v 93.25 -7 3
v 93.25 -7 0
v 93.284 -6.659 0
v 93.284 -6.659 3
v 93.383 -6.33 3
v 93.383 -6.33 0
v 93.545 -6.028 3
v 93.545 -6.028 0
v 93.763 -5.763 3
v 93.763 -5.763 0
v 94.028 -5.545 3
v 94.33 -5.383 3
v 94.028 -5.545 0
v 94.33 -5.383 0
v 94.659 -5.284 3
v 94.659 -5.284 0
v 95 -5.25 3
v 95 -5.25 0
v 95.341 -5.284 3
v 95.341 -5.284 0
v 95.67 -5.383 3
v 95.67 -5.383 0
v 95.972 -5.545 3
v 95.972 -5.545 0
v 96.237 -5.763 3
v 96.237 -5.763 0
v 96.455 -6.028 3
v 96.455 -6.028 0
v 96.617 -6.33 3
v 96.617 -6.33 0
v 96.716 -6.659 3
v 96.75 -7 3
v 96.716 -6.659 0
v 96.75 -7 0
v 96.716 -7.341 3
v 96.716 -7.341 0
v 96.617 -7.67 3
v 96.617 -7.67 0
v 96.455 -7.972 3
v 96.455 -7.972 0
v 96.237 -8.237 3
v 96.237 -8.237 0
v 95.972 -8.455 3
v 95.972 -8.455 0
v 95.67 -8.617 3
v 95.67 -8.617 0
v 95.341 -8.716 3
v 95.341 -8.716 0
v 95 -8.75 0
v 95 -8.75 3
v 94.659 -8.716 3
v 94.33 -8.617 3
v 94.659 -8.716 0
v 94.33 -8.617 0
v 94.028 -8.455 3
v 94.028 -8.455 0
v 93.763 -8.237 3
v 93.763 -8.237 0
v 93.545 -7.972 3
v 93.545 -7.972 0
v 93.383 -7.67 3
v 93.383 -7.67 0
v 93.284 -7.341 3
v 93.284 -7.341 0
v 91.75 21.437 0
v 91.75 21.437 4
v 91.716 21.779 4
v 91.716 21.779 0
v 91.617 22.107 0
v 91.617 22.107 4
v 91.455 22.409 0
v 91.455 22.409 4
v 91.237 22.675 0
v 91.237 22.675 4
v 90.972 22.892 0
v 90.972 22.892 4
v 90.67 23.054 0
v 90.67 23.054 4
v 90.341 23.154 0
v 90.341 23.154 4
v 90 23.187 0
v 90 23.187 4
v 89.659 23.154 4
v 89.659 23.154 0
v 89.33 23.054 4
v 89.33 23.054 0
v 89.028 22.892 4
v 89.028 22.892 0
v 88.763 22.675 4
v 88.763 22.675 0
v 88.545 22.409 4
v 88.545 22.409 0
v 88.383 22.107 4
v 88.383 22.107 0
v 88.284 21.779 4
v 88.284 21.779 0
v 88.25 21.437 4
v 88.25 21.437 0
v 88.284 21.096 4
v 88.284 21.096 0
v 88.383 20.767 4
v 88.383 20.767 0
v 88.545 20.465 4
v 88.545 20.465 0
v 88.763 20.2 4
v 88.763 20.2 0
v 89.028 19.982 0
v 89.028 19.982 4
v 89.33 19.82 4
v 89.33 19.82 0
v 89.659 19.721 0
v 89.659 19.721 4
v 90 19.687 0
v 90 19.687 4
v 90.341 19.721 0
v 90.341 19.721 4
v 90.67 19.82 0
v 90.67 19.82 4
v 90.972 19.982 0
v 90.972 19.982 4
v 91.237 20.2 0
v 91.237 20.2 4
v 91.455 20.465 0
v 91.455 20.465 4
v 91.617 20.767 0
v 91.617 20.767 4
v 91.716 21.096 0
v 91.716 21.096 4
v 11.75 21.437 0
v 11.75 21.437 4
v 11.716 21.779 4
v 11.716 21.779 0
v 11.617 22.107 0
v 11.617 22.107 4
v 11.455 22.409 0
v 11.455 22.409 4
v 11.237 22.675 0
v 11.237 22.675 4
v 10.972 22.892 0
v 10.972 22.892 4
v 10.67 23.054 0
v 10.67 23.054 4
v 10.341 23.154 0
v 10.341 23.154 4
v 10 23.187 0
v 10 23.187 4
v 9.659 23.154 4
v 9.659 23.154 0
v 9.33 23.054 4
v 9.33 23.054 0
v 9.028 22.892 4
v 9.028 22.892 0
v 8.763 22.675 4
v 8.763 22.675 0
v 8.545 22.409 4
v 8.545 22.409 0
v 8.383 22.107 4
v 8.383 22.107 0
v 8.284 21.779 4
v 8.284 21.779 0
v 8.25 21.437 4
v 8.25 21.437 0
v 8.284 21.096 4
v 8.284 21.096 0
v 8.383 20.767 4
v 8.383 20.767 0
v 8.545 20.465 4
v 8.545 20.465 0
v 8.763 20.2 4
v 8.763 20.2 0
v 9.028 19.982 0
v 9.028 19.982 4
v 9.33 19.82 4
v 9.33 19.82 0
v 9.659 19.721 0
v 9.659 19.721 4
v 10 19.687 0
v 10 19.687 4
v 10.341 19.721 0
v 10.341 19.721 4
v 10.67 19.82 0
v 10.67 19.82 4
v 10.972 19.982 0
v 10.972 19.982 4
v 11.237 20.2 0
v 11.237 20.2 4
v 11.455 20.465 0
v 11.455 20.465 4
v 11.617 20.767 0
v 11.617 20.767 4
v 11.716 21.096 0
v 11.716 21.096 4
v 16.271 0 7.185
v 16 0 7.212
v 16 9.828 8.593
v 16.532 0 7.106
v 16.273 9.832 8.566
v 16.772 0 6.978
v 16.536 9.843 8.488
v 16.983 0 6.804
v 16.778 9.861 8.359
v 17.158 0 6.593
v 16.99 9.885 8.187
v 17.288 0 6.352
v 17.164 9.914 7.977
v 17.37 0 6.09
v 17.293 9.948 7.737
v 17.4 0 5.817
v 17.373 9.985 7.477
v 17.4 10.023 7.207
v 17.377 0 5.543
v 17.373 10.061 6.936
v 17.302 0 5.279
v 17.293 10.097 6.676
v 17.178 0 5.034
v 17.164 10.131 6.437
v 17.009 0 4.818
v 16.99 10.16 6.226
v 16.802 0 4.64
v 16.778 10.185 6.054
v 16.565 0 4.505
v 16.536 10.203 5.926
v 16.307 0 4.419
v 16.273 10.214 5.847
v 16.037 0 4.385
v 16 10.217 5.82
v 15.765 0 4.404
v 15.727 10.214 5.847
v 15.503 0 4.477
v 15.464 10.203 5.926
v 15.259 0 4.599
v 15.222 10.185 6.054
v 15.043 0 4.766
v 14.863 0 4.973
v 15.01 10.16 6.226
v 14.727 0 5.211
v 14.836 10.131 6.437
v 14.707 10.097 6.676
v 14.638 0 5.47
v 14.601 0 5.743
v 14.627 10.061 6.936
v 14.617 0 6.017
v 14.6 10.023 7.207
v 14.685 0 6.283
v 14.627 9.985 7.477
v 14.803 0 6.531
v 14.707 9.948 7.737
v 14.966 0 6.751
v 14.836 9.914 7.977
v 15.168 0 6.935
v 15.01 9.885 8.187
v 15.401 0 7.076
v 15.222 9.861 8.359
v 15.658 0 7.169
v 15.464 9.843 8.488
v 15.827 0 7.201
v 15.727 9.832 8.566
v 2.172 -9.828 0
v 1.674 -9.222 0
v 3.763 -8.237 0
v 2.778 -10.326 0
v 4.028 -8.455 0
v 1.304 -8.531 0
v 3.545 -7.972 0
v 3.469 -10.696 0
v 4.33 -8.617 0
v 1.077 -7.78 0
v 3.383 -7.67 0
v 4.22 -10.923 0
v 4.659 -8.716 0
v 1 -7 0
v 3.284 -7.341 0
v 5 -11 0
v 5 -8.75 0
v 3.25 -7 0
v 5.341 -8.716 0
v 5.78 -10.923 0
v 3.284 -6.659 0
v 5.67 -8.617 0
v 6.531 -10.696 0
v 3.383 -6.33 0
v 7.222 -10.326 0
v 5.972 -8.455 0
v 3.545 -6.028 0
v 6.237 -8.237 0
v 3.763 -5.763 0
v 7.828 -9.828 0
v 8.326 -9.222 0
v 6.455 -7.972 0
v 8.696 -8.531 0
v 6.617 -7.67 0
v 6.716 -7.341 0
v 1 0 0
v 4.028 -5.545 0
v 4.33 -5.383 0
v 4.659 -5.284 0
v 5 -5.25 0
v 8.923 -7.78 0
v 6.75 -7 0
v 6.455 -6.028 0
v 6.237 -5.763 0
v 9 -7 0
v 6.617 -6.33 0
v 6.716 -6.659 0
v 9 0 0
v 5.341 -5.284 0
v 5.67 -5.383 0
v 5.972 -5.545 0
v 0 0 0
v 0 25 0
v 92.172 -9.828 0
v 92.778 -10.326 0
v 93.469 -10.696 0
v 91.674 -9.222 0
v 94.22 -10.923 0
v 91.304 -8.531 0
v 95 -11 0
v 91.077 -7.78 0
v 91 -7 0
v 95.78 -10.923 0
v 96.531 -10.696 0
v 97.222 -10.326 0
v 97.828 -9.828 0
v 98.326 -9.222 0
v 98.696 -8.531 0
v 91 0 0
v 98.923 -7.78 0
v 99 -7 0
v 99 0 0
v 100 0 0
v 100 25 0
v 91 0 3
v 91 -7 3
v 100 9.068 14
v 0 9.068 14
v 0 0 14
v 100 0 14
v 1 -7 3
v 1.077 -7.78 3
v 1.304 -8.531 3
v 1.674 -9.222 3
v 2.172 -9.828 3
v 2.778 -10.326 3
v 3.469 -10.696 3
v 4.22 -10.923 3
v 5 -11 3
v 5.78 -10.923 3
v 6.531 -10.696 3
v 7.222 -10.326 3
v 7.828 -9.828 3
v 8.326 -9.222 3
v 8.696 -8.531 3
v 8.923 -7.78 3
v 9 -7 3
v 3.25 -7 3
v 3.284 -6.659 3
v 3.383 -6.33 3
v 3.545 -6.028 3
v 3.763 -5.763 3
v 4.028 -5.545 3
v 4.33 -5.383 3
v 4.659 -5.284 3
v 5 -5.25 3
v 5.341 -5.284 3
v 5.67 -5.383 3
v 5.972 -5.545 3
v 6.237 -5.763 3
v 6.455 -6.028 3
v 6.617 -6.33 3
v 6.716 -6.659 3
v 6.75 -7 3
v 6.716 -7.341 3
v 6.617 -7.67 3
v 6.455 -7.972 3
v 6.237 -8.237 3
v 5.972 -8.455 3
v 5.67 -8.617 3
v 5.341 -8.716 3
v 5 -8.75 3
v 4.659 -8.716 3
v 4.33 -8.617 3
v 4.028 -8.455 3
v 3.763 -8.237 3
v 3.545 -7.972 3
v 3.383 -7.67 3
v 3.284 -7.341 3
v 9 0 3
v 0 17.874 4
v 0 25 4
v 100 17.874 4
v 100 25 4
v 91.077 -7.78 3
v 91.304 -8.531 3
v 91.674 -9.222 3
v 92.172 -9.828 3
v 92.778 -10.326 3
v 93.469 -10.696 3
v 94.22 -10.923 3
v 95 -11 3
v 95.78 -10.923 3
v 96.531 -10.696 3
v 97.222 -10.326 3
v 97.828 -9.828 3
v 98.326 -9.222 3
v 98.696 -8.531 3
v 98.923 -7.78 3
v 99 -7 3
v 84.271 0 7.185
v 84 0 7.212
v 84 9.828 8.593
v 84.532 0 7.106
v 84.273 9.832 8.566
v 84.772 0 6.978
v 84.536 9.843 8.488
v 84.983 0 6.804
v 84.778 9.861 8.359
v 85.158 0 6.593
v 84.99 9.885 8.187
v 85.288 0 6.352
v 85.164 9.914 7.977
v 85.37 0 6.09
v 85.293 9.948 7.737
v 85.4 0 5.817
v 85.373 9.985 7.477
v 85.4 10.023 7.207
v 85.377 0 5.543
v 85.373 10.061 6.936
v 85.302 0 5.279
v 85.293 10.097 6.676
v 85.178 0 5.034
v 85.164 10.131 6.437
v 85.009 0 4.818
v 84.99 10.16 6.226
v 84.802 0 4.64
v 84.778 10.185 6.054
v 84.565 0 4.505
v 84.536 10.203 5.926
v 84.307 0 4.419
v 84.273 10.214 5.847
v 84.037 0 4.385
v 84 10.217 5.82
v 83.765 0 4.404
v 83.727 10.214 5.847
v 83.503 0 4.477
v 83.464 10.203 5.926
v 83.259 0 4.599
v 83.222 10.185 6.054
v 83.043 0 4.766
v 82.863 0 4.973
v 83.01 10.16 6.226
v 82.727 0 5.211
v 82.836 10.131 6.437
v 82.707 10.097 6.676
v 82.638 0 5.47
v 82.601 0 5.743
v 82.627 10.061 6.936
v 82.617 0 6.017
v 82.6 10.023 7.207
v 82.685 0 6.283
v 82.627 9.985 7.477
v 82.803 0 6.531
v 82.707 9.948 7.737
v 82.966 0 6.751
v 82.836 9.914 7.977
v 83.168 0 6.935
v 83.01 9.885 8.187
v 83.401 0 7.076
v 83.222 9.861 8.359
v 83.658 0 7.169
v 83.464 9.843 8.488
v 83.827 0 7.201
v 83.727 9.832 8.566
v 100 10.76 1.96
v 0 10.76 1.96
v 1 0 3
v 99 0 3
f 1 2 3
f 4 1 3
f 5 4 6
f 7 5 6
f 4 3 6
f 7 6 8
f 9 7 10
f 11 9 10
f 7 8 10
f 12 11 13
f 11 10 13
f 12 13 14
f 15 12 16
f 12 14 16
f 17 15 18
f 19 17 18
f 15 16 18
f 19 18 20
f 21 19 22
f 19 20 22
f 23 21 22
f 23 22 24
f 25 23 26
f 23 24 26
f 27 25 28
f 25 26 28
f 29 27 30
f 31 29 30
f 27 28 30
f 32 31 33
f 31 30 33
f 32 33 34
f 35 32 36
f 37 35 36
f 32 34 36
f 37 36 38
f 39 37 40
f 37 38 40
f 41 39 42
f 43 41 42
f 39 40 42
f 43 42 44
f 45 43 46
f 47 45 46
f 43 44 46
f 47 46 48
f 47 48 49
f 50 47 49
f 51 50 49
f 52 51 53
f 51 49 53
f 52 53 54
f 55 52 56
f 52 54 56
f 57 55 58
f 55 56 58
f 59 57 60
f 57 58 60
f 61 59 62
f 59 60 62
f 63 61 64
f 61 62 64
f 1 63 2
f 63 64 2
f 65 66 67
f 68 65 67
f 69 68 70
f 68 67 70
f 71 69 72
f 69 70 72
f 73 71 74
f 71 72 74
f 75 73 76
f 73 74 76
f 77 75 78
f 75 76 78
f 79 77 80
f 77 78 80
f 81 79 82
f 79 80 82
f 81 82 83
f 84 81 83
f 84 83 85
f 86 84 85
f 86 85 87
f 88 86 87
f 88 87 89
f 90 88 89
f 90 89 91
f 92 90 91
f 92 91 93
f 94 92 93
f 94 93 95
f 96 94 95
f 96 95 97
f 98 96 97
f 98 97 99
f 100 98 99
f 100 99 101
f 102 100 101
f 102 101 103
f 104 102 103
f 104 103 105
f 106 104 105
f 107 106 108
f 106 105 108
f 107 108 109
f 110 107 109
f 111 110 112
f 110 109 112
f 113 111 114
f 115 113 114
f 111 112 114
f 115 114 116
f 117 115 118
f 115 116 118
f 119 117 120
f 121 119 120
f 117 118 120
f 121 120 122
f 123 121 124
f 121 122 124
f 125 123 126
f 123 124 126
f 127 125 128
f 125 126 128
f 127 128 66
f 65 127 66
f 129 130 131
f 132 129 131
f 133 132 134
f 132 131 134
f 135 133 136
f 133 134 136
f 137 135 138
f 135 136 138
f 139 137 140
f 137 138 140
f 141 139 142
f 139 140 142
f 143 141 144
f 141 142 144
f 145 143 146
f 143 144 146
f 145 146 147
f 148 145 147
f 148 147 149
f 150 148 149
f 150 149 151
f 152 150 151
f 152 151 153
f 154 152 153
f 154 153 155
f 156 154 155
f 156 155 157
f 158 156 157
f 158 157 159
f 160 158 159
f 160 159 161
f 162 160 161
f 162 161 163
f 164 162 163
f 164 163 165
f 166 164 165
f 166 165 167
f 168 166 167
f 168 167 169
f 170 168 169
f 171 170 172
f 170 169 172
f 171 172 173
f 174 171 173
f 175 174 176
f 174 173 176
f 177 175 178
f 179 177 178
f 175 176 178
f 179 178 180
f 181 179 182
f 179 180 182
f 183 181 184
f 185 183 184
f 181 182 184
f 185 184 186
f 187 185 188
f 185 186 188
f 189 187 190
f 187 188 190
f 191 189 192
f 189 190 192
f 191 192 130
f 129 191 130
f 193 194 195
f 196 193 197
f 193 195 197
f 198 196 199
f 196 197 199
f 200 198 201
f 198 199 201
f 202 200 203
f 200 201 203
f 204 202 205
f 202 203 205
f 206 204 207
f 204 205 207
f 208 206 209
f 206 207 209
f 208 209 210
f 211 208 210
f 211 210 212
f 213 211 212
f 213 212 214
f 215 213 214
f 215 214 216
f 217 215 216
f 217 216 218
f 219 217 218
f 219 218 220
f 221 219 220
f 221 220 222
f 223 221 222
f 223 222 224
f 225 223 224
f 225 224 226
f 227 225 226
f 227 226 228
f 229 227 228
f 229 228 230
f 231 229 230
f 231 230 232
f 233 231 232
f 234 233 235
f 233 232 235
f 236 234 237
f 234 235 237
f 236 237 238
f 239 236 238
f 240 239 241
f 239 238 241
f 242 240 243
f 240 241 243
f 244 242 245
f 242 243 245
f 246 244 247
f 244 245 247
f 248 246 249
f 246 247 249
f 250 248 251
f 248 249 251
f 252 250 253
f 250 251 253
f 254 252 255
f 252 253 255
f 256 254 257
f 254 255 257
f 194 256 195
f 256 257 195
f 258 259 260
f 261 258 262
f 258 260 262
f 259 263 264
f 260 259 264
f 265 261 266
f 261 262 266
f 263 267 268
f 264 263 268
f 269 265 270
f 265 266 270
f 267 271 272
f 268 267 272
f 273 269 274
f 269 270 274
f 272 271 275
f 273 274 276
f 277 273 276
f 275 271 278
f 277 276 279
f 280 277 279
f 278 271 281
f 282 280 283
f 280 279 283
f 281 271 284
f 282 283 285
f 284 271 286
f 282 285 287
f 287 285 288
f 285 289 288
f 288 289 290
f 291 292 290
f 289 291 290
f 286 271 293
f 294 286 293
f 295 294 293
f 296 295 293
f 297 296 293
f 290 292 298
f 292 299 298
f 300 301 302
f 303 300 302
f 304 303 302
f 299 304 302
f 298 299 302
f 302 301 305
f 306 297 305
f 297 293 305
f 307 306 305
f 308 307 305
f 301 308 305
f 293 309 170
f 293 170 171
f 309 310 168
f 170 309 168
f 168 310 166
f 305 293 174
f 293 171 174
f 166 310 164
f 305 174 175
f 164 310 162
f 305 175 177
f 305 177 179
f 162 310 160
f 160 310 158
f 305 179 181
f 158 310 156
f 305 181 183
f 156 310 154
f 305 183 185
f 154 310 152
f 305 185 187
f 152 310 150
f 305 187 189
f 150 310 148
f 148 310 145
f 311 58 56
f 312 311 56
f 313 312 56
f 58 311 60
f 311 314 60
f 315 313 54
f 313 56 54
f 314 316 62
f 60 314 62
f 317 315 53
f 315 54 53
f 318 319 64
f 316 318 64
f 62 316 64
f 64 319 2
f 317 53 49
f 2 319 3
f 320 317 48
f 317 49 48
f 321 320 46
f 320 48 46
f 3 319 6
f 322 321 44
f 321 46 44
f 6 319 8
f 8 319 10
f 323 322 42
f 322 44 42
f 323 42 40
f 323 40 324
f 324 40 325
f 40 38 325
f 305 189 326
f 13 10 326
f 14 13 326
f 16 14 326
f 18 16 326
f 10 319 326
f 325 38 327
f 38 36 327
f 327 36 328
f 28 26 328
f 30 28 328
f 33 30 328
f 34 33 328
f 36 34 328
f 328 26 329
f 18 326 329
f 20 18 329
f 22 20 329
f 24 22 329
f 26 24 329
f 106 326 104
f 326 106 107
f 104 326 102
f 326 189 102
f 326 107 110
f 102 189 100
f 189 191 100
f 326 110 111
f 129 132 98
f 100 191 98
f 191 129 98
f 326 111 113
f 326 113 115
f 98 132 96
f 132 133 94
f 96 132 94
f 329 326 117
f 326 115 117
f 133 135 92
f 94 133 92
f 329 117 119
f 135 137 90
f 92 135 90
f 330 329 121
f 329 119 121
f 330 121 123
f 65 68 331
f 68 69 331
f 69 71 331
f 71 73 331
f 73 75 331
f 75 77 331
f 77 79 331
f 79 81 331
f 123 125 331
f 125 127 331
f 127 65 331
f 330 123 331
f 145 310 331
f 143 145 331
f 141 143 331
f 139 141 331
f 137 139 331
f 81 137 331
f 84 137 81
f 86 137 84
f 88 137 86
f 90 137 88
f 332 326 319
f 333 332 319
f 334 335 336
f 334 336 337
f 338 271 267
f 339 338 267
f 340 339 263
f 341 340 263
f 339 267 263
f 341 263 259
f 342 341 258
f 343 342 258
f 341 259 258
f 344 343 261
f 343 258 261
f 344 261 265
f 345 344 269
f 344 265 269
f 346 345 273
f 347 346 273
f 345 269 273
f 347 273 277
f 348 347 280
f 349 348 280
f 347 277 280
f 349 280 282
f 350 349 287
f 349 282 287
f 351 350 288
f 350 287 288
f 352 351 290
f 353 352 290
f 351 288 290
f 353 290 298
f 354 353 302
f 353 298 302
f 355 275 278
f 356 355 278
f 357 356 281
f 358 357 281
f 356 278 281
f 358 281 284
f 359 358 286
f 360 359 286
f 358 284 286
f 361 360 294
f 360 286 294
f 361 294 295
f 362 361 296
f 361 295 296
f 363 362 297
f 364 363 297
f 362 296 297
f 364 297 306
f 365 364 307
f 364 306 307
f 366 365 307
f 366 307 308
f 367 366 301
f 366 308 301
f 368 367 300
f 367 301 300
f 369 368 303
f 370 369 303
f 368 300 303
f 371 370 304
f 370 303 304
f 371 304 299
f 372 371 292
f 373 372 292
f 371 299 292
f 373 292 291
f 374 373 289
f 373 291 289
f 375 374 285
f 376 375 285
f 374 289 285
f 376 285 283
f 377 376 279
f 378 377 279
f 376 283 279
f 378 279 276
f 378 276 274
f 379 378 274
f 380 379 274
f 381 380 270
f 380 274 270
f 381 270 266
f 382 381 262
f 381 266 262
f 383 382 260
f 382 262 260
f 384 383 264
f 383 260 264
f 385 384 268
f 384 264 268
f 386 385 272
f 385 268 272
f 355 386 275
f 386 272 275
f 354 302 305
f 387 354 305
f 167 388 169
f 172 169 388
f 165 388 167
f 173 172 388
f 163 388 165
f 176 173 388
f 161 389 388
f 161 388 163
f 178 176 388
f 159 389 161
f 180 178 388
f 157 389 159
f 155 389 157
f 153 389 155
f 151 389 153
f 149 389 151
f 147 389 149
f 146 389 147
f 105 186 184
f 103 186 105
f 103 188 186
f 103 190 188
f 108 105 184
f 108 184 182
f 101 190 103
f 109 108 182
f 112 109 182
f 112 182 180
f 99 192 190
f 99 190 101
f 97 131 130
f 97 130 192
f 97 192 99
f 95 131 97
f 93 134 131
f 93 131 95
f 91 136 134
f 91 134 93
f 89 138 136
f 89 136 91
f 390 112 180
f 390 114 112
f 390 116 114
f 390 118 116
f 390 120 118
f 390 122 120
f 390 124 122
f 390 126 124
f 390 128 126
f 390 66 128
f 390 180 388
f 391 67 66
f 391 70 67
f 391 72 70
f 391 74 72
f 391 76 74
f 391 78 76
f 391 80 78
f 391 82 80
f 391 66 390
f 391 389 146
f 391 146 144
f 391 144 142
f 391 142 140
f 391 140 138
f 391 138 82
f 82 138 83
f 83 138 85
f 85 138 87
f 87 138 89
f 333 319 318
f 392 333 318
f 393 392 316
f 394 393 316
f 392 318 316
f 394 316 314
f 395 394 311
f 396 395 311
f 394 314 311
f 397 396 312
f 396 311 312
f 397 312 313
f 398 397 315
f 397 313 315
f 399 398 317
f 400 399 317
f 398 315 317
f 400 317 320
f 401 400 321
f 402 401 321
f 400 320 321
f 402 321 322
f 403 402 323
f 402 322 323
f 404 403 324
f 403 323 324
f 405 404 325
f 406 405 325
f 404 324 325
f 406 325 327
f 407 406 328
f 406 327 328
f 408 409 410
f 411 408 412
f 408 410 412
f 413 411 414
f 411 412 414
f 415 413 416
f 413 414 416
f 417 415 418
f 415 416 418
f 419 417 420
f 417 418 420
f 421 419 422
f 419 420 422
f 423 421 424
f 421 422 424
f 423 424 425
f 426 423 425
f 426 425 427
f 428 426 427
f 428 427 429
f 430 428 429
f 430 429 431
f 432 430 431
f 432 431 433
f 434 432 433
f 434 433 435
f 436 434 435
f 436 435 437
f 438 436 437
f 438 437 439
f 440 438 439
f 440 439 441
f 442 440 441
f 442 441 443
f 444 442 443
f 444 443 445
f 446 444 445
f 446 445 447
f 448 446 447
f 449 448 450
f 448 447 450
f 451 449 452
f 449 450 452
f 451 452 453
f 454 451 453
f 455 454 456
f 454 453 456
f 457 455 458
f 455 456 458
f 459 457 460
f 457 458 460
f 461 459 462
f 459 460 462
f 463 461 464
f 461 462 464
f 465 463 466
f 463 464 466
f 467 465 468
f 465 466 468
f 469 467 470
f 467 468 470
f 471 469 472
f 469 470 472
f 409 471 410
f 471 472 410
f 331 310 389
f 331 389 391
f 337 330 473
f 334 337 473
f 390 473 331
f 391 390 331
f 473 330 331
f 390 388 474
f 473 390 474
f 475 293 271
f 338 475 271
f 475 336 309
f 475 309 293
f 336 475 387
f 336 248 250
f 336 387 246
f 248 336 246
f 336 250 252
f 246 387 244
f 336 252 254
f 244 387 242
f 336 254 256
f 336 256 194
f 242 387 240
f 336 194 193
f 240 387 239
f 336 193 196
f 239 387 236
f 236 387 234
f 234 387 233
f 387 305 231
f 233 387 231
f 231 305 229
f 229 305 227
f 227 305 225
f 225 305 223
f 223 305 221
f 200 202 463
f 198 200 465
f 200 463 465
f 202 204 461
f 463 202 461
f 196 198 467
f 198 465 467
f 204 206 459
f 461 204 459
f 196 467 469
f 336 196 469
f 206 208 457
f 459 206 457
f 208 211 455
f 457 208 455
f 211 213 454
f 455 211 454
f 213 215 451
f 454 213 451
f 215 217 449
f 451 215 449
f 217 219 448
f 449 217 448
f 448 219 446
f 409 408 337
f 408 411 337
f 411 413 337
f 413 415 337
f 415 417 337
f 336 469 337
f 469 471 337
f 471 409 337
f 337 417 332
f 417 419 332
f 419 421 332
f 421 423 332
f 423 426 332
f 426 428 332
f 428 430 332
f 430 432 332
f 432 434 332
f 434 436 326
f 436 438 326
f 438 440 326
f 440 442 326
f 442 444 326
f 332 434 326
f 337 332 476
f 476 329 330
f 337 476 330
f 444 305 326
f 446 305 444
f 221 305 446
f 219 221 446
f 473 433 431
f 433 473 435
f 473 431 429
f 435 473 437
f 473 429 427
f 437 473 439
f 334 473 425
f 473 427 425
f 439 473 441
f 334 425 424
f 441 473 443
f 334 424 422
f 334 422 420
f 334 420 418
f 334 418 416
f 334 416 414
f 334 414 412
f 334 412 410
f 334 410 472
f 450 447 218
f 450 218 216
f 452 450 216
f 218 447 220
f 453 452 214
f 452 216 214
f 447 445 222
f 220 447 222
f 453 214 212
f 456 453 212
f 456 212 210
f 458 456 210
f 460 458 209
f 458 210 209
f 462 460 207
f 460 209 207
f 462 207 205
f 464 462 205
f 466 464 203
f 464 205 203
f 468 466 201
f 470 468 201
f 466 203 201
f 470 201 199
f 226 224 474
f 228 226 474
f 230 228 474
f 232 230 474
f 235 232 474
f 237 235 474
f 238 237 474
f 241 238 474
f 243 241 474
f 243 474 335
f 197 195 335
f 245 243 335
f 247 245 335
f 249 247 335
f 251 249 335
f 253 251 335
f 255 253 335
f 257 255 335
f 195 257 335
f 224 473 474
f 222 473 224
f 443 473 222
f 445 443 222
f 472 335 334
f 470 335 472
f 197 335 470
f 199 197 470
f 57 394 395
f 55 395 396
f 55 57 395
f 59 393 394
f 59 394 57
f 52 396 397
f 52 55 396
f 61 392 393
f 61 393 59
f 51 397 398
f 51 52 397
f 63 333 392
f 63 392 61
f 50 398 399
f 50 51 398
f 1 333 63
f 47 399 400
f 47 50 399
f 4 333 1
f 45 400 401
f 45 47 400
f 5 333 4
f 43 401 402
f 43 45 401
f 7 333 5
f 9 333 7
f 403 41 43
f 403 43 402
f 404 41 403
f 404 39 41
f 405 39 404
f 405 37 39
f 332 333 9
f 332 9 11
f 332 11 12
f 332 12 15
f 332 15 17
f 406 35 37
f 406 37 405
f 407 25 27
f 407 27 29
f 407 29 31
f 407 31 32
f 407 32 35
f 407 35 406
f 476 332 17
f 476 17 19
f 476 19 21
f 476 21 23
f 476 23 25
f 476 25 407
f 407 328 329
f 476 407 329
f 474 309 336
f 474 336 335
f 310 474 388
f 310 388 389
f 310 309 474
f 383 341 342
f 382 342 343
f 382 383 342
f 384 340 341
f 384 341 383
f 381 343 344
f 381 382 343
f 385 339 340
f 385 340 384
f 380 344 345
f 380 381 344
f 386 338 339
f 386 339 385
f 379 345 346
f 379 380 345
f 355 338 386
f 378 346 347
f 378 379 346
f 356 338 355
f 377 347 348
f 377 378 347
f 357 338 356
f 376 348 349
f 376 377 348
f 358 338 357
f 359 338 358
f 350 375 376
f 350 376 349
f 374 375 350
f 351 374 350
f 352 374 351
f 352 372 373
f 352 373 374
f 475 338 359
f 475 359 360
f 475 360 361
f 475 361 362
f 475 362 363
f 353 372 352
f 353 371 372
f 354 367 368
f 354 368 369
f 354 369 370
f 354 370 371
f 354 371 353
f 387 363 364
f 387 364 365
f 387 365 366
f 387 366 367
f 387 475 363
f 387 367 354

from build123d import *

# Parameters (mm, degrees)
SKETCH_1_W          = 100
SKETCH_1_H          = 25
EXTRUDE_1_DEPTH     = 4
SKETCH_2_W          = 100
SKETCH_2_H          = 10.76
EXTRUDE_2_DEPTH     = 10
CUT_EXTRUDE_1_DEPTH = 105.024035684
SKETCH_6_R          = 1.4
CUT_EXTRUDE_2_DEPTH = 102.768128406
SKETCH_7_R          = 1.75
EXTRUDE_3_DEPTH     = 3
SKETCH_8_R          = 1.75
CUT_EXTRUDE_3_DEPTH = 104.561575886


with BuildPart() as part:
    # 스케치1 → 보스-돌출1 (new body)
    with BuildSketch(Plane.XY):
        with Locations((50, 12.5)):
            Rectangle(SKETCH_1_W, SKETCH_1_H)
    extrude(amount=EXTRUDE_1_DEPTH)

    # 스케치2 → 보스-돌출2 (add)
    with BuildSketch(Plane.XY.offset(4)):
        with Locations((50, 5.38)):
            Rectangle(SKETCH_2_W, SKETCH_2_H)
    extrude(amount=EXTRUDE_2_DEPTH)

    # 스케치5 → 컷-돌출1 (cut, through all)
    with BuildSketch(Plane.ZY):
        Polygon((1.96, 10.76), (19, 8.365184177), (4, 17.874325465), align=None)
    extrude(amount=-CUT_EXTRUDE_1_DEPTH, mode=Mode.SUBTRACT)

    # 스케치6 → 컷-돌출2 (cut, through all)
    with BuildSketch(Plane(origin=(0, 10.821712533, 1.520892512), x_dir=(1, 0, 0), z_dir=(0, 0.9902680687415709, 0.1391731009600619))):
        with Locations(Location((16, -5.741746822, 0), (0, 0, 270))):
            Circle(SKETCH_6_R)
        with Locations(Location((84, -5.741746822, 0), (0, 0, 270))):
            Circle(SKETCH_6_R)
    extrude(amount=-CUT_EXTRUDE_2_DEPTH, mode=Mode.SUBTRACT)

    # 스케치7 → 보스-돌출3 (add)
    # profile 1 of 2: a face of its own
    with BuildSketch(Plane(origin=(0, 0, 0), x_dir=(-1, 0, 0), z_dir=(0, 0, -1))):
        with BuildLine():
            Line((-99, -7), (-99, 0))
            Line((-99, 0), (-91, 0))
            Line((-91, 0), (-91, -7))
            ThreePointArc((-91, -7), (-95, -11), (-99, -7))
        make_face()
        with Locations((-95, -7)):
            Circle(SKETCH_7_R, mode=Mode.SUBTRACT)
    # profile 2 of 2: a face of its own
    with BuildSketch(Plane(origin=(0, 0, 0), x_dir=(-1, 0, 0), z_dir=(0, 0, -1))):
        with BuildLine():
            Line((-9, -7), (-9, 0))
            Line((-9, 0), (-1, 0))
            Line((-1, 0), (-1, -7))
            ThreePointArc((-1, -7), (-5, -11), (-9, -7))
        make_face()
        with Locations((-5, -7)):
            Circle(SKETCH_7_R, mode=Mode.SUBTRACT)
    extrude(amount=-EXTRUDE_3_DEPTH)

    # 스케치8 → 컷-돌출3 (cut, through all)
    with BuildSketch(Plane.XY.offset(4)):
        with Locations((10, 21.437162733)):
            Circle(SKETCH_8_R)
        with Locations((90, 21.437162733)):
            Circle(SKETCH_8_R)
    extrude(amount=-CUT_EXTRUDE_3_DEPTH, mode=Mode.SUBTRACT)


solid = part.part
